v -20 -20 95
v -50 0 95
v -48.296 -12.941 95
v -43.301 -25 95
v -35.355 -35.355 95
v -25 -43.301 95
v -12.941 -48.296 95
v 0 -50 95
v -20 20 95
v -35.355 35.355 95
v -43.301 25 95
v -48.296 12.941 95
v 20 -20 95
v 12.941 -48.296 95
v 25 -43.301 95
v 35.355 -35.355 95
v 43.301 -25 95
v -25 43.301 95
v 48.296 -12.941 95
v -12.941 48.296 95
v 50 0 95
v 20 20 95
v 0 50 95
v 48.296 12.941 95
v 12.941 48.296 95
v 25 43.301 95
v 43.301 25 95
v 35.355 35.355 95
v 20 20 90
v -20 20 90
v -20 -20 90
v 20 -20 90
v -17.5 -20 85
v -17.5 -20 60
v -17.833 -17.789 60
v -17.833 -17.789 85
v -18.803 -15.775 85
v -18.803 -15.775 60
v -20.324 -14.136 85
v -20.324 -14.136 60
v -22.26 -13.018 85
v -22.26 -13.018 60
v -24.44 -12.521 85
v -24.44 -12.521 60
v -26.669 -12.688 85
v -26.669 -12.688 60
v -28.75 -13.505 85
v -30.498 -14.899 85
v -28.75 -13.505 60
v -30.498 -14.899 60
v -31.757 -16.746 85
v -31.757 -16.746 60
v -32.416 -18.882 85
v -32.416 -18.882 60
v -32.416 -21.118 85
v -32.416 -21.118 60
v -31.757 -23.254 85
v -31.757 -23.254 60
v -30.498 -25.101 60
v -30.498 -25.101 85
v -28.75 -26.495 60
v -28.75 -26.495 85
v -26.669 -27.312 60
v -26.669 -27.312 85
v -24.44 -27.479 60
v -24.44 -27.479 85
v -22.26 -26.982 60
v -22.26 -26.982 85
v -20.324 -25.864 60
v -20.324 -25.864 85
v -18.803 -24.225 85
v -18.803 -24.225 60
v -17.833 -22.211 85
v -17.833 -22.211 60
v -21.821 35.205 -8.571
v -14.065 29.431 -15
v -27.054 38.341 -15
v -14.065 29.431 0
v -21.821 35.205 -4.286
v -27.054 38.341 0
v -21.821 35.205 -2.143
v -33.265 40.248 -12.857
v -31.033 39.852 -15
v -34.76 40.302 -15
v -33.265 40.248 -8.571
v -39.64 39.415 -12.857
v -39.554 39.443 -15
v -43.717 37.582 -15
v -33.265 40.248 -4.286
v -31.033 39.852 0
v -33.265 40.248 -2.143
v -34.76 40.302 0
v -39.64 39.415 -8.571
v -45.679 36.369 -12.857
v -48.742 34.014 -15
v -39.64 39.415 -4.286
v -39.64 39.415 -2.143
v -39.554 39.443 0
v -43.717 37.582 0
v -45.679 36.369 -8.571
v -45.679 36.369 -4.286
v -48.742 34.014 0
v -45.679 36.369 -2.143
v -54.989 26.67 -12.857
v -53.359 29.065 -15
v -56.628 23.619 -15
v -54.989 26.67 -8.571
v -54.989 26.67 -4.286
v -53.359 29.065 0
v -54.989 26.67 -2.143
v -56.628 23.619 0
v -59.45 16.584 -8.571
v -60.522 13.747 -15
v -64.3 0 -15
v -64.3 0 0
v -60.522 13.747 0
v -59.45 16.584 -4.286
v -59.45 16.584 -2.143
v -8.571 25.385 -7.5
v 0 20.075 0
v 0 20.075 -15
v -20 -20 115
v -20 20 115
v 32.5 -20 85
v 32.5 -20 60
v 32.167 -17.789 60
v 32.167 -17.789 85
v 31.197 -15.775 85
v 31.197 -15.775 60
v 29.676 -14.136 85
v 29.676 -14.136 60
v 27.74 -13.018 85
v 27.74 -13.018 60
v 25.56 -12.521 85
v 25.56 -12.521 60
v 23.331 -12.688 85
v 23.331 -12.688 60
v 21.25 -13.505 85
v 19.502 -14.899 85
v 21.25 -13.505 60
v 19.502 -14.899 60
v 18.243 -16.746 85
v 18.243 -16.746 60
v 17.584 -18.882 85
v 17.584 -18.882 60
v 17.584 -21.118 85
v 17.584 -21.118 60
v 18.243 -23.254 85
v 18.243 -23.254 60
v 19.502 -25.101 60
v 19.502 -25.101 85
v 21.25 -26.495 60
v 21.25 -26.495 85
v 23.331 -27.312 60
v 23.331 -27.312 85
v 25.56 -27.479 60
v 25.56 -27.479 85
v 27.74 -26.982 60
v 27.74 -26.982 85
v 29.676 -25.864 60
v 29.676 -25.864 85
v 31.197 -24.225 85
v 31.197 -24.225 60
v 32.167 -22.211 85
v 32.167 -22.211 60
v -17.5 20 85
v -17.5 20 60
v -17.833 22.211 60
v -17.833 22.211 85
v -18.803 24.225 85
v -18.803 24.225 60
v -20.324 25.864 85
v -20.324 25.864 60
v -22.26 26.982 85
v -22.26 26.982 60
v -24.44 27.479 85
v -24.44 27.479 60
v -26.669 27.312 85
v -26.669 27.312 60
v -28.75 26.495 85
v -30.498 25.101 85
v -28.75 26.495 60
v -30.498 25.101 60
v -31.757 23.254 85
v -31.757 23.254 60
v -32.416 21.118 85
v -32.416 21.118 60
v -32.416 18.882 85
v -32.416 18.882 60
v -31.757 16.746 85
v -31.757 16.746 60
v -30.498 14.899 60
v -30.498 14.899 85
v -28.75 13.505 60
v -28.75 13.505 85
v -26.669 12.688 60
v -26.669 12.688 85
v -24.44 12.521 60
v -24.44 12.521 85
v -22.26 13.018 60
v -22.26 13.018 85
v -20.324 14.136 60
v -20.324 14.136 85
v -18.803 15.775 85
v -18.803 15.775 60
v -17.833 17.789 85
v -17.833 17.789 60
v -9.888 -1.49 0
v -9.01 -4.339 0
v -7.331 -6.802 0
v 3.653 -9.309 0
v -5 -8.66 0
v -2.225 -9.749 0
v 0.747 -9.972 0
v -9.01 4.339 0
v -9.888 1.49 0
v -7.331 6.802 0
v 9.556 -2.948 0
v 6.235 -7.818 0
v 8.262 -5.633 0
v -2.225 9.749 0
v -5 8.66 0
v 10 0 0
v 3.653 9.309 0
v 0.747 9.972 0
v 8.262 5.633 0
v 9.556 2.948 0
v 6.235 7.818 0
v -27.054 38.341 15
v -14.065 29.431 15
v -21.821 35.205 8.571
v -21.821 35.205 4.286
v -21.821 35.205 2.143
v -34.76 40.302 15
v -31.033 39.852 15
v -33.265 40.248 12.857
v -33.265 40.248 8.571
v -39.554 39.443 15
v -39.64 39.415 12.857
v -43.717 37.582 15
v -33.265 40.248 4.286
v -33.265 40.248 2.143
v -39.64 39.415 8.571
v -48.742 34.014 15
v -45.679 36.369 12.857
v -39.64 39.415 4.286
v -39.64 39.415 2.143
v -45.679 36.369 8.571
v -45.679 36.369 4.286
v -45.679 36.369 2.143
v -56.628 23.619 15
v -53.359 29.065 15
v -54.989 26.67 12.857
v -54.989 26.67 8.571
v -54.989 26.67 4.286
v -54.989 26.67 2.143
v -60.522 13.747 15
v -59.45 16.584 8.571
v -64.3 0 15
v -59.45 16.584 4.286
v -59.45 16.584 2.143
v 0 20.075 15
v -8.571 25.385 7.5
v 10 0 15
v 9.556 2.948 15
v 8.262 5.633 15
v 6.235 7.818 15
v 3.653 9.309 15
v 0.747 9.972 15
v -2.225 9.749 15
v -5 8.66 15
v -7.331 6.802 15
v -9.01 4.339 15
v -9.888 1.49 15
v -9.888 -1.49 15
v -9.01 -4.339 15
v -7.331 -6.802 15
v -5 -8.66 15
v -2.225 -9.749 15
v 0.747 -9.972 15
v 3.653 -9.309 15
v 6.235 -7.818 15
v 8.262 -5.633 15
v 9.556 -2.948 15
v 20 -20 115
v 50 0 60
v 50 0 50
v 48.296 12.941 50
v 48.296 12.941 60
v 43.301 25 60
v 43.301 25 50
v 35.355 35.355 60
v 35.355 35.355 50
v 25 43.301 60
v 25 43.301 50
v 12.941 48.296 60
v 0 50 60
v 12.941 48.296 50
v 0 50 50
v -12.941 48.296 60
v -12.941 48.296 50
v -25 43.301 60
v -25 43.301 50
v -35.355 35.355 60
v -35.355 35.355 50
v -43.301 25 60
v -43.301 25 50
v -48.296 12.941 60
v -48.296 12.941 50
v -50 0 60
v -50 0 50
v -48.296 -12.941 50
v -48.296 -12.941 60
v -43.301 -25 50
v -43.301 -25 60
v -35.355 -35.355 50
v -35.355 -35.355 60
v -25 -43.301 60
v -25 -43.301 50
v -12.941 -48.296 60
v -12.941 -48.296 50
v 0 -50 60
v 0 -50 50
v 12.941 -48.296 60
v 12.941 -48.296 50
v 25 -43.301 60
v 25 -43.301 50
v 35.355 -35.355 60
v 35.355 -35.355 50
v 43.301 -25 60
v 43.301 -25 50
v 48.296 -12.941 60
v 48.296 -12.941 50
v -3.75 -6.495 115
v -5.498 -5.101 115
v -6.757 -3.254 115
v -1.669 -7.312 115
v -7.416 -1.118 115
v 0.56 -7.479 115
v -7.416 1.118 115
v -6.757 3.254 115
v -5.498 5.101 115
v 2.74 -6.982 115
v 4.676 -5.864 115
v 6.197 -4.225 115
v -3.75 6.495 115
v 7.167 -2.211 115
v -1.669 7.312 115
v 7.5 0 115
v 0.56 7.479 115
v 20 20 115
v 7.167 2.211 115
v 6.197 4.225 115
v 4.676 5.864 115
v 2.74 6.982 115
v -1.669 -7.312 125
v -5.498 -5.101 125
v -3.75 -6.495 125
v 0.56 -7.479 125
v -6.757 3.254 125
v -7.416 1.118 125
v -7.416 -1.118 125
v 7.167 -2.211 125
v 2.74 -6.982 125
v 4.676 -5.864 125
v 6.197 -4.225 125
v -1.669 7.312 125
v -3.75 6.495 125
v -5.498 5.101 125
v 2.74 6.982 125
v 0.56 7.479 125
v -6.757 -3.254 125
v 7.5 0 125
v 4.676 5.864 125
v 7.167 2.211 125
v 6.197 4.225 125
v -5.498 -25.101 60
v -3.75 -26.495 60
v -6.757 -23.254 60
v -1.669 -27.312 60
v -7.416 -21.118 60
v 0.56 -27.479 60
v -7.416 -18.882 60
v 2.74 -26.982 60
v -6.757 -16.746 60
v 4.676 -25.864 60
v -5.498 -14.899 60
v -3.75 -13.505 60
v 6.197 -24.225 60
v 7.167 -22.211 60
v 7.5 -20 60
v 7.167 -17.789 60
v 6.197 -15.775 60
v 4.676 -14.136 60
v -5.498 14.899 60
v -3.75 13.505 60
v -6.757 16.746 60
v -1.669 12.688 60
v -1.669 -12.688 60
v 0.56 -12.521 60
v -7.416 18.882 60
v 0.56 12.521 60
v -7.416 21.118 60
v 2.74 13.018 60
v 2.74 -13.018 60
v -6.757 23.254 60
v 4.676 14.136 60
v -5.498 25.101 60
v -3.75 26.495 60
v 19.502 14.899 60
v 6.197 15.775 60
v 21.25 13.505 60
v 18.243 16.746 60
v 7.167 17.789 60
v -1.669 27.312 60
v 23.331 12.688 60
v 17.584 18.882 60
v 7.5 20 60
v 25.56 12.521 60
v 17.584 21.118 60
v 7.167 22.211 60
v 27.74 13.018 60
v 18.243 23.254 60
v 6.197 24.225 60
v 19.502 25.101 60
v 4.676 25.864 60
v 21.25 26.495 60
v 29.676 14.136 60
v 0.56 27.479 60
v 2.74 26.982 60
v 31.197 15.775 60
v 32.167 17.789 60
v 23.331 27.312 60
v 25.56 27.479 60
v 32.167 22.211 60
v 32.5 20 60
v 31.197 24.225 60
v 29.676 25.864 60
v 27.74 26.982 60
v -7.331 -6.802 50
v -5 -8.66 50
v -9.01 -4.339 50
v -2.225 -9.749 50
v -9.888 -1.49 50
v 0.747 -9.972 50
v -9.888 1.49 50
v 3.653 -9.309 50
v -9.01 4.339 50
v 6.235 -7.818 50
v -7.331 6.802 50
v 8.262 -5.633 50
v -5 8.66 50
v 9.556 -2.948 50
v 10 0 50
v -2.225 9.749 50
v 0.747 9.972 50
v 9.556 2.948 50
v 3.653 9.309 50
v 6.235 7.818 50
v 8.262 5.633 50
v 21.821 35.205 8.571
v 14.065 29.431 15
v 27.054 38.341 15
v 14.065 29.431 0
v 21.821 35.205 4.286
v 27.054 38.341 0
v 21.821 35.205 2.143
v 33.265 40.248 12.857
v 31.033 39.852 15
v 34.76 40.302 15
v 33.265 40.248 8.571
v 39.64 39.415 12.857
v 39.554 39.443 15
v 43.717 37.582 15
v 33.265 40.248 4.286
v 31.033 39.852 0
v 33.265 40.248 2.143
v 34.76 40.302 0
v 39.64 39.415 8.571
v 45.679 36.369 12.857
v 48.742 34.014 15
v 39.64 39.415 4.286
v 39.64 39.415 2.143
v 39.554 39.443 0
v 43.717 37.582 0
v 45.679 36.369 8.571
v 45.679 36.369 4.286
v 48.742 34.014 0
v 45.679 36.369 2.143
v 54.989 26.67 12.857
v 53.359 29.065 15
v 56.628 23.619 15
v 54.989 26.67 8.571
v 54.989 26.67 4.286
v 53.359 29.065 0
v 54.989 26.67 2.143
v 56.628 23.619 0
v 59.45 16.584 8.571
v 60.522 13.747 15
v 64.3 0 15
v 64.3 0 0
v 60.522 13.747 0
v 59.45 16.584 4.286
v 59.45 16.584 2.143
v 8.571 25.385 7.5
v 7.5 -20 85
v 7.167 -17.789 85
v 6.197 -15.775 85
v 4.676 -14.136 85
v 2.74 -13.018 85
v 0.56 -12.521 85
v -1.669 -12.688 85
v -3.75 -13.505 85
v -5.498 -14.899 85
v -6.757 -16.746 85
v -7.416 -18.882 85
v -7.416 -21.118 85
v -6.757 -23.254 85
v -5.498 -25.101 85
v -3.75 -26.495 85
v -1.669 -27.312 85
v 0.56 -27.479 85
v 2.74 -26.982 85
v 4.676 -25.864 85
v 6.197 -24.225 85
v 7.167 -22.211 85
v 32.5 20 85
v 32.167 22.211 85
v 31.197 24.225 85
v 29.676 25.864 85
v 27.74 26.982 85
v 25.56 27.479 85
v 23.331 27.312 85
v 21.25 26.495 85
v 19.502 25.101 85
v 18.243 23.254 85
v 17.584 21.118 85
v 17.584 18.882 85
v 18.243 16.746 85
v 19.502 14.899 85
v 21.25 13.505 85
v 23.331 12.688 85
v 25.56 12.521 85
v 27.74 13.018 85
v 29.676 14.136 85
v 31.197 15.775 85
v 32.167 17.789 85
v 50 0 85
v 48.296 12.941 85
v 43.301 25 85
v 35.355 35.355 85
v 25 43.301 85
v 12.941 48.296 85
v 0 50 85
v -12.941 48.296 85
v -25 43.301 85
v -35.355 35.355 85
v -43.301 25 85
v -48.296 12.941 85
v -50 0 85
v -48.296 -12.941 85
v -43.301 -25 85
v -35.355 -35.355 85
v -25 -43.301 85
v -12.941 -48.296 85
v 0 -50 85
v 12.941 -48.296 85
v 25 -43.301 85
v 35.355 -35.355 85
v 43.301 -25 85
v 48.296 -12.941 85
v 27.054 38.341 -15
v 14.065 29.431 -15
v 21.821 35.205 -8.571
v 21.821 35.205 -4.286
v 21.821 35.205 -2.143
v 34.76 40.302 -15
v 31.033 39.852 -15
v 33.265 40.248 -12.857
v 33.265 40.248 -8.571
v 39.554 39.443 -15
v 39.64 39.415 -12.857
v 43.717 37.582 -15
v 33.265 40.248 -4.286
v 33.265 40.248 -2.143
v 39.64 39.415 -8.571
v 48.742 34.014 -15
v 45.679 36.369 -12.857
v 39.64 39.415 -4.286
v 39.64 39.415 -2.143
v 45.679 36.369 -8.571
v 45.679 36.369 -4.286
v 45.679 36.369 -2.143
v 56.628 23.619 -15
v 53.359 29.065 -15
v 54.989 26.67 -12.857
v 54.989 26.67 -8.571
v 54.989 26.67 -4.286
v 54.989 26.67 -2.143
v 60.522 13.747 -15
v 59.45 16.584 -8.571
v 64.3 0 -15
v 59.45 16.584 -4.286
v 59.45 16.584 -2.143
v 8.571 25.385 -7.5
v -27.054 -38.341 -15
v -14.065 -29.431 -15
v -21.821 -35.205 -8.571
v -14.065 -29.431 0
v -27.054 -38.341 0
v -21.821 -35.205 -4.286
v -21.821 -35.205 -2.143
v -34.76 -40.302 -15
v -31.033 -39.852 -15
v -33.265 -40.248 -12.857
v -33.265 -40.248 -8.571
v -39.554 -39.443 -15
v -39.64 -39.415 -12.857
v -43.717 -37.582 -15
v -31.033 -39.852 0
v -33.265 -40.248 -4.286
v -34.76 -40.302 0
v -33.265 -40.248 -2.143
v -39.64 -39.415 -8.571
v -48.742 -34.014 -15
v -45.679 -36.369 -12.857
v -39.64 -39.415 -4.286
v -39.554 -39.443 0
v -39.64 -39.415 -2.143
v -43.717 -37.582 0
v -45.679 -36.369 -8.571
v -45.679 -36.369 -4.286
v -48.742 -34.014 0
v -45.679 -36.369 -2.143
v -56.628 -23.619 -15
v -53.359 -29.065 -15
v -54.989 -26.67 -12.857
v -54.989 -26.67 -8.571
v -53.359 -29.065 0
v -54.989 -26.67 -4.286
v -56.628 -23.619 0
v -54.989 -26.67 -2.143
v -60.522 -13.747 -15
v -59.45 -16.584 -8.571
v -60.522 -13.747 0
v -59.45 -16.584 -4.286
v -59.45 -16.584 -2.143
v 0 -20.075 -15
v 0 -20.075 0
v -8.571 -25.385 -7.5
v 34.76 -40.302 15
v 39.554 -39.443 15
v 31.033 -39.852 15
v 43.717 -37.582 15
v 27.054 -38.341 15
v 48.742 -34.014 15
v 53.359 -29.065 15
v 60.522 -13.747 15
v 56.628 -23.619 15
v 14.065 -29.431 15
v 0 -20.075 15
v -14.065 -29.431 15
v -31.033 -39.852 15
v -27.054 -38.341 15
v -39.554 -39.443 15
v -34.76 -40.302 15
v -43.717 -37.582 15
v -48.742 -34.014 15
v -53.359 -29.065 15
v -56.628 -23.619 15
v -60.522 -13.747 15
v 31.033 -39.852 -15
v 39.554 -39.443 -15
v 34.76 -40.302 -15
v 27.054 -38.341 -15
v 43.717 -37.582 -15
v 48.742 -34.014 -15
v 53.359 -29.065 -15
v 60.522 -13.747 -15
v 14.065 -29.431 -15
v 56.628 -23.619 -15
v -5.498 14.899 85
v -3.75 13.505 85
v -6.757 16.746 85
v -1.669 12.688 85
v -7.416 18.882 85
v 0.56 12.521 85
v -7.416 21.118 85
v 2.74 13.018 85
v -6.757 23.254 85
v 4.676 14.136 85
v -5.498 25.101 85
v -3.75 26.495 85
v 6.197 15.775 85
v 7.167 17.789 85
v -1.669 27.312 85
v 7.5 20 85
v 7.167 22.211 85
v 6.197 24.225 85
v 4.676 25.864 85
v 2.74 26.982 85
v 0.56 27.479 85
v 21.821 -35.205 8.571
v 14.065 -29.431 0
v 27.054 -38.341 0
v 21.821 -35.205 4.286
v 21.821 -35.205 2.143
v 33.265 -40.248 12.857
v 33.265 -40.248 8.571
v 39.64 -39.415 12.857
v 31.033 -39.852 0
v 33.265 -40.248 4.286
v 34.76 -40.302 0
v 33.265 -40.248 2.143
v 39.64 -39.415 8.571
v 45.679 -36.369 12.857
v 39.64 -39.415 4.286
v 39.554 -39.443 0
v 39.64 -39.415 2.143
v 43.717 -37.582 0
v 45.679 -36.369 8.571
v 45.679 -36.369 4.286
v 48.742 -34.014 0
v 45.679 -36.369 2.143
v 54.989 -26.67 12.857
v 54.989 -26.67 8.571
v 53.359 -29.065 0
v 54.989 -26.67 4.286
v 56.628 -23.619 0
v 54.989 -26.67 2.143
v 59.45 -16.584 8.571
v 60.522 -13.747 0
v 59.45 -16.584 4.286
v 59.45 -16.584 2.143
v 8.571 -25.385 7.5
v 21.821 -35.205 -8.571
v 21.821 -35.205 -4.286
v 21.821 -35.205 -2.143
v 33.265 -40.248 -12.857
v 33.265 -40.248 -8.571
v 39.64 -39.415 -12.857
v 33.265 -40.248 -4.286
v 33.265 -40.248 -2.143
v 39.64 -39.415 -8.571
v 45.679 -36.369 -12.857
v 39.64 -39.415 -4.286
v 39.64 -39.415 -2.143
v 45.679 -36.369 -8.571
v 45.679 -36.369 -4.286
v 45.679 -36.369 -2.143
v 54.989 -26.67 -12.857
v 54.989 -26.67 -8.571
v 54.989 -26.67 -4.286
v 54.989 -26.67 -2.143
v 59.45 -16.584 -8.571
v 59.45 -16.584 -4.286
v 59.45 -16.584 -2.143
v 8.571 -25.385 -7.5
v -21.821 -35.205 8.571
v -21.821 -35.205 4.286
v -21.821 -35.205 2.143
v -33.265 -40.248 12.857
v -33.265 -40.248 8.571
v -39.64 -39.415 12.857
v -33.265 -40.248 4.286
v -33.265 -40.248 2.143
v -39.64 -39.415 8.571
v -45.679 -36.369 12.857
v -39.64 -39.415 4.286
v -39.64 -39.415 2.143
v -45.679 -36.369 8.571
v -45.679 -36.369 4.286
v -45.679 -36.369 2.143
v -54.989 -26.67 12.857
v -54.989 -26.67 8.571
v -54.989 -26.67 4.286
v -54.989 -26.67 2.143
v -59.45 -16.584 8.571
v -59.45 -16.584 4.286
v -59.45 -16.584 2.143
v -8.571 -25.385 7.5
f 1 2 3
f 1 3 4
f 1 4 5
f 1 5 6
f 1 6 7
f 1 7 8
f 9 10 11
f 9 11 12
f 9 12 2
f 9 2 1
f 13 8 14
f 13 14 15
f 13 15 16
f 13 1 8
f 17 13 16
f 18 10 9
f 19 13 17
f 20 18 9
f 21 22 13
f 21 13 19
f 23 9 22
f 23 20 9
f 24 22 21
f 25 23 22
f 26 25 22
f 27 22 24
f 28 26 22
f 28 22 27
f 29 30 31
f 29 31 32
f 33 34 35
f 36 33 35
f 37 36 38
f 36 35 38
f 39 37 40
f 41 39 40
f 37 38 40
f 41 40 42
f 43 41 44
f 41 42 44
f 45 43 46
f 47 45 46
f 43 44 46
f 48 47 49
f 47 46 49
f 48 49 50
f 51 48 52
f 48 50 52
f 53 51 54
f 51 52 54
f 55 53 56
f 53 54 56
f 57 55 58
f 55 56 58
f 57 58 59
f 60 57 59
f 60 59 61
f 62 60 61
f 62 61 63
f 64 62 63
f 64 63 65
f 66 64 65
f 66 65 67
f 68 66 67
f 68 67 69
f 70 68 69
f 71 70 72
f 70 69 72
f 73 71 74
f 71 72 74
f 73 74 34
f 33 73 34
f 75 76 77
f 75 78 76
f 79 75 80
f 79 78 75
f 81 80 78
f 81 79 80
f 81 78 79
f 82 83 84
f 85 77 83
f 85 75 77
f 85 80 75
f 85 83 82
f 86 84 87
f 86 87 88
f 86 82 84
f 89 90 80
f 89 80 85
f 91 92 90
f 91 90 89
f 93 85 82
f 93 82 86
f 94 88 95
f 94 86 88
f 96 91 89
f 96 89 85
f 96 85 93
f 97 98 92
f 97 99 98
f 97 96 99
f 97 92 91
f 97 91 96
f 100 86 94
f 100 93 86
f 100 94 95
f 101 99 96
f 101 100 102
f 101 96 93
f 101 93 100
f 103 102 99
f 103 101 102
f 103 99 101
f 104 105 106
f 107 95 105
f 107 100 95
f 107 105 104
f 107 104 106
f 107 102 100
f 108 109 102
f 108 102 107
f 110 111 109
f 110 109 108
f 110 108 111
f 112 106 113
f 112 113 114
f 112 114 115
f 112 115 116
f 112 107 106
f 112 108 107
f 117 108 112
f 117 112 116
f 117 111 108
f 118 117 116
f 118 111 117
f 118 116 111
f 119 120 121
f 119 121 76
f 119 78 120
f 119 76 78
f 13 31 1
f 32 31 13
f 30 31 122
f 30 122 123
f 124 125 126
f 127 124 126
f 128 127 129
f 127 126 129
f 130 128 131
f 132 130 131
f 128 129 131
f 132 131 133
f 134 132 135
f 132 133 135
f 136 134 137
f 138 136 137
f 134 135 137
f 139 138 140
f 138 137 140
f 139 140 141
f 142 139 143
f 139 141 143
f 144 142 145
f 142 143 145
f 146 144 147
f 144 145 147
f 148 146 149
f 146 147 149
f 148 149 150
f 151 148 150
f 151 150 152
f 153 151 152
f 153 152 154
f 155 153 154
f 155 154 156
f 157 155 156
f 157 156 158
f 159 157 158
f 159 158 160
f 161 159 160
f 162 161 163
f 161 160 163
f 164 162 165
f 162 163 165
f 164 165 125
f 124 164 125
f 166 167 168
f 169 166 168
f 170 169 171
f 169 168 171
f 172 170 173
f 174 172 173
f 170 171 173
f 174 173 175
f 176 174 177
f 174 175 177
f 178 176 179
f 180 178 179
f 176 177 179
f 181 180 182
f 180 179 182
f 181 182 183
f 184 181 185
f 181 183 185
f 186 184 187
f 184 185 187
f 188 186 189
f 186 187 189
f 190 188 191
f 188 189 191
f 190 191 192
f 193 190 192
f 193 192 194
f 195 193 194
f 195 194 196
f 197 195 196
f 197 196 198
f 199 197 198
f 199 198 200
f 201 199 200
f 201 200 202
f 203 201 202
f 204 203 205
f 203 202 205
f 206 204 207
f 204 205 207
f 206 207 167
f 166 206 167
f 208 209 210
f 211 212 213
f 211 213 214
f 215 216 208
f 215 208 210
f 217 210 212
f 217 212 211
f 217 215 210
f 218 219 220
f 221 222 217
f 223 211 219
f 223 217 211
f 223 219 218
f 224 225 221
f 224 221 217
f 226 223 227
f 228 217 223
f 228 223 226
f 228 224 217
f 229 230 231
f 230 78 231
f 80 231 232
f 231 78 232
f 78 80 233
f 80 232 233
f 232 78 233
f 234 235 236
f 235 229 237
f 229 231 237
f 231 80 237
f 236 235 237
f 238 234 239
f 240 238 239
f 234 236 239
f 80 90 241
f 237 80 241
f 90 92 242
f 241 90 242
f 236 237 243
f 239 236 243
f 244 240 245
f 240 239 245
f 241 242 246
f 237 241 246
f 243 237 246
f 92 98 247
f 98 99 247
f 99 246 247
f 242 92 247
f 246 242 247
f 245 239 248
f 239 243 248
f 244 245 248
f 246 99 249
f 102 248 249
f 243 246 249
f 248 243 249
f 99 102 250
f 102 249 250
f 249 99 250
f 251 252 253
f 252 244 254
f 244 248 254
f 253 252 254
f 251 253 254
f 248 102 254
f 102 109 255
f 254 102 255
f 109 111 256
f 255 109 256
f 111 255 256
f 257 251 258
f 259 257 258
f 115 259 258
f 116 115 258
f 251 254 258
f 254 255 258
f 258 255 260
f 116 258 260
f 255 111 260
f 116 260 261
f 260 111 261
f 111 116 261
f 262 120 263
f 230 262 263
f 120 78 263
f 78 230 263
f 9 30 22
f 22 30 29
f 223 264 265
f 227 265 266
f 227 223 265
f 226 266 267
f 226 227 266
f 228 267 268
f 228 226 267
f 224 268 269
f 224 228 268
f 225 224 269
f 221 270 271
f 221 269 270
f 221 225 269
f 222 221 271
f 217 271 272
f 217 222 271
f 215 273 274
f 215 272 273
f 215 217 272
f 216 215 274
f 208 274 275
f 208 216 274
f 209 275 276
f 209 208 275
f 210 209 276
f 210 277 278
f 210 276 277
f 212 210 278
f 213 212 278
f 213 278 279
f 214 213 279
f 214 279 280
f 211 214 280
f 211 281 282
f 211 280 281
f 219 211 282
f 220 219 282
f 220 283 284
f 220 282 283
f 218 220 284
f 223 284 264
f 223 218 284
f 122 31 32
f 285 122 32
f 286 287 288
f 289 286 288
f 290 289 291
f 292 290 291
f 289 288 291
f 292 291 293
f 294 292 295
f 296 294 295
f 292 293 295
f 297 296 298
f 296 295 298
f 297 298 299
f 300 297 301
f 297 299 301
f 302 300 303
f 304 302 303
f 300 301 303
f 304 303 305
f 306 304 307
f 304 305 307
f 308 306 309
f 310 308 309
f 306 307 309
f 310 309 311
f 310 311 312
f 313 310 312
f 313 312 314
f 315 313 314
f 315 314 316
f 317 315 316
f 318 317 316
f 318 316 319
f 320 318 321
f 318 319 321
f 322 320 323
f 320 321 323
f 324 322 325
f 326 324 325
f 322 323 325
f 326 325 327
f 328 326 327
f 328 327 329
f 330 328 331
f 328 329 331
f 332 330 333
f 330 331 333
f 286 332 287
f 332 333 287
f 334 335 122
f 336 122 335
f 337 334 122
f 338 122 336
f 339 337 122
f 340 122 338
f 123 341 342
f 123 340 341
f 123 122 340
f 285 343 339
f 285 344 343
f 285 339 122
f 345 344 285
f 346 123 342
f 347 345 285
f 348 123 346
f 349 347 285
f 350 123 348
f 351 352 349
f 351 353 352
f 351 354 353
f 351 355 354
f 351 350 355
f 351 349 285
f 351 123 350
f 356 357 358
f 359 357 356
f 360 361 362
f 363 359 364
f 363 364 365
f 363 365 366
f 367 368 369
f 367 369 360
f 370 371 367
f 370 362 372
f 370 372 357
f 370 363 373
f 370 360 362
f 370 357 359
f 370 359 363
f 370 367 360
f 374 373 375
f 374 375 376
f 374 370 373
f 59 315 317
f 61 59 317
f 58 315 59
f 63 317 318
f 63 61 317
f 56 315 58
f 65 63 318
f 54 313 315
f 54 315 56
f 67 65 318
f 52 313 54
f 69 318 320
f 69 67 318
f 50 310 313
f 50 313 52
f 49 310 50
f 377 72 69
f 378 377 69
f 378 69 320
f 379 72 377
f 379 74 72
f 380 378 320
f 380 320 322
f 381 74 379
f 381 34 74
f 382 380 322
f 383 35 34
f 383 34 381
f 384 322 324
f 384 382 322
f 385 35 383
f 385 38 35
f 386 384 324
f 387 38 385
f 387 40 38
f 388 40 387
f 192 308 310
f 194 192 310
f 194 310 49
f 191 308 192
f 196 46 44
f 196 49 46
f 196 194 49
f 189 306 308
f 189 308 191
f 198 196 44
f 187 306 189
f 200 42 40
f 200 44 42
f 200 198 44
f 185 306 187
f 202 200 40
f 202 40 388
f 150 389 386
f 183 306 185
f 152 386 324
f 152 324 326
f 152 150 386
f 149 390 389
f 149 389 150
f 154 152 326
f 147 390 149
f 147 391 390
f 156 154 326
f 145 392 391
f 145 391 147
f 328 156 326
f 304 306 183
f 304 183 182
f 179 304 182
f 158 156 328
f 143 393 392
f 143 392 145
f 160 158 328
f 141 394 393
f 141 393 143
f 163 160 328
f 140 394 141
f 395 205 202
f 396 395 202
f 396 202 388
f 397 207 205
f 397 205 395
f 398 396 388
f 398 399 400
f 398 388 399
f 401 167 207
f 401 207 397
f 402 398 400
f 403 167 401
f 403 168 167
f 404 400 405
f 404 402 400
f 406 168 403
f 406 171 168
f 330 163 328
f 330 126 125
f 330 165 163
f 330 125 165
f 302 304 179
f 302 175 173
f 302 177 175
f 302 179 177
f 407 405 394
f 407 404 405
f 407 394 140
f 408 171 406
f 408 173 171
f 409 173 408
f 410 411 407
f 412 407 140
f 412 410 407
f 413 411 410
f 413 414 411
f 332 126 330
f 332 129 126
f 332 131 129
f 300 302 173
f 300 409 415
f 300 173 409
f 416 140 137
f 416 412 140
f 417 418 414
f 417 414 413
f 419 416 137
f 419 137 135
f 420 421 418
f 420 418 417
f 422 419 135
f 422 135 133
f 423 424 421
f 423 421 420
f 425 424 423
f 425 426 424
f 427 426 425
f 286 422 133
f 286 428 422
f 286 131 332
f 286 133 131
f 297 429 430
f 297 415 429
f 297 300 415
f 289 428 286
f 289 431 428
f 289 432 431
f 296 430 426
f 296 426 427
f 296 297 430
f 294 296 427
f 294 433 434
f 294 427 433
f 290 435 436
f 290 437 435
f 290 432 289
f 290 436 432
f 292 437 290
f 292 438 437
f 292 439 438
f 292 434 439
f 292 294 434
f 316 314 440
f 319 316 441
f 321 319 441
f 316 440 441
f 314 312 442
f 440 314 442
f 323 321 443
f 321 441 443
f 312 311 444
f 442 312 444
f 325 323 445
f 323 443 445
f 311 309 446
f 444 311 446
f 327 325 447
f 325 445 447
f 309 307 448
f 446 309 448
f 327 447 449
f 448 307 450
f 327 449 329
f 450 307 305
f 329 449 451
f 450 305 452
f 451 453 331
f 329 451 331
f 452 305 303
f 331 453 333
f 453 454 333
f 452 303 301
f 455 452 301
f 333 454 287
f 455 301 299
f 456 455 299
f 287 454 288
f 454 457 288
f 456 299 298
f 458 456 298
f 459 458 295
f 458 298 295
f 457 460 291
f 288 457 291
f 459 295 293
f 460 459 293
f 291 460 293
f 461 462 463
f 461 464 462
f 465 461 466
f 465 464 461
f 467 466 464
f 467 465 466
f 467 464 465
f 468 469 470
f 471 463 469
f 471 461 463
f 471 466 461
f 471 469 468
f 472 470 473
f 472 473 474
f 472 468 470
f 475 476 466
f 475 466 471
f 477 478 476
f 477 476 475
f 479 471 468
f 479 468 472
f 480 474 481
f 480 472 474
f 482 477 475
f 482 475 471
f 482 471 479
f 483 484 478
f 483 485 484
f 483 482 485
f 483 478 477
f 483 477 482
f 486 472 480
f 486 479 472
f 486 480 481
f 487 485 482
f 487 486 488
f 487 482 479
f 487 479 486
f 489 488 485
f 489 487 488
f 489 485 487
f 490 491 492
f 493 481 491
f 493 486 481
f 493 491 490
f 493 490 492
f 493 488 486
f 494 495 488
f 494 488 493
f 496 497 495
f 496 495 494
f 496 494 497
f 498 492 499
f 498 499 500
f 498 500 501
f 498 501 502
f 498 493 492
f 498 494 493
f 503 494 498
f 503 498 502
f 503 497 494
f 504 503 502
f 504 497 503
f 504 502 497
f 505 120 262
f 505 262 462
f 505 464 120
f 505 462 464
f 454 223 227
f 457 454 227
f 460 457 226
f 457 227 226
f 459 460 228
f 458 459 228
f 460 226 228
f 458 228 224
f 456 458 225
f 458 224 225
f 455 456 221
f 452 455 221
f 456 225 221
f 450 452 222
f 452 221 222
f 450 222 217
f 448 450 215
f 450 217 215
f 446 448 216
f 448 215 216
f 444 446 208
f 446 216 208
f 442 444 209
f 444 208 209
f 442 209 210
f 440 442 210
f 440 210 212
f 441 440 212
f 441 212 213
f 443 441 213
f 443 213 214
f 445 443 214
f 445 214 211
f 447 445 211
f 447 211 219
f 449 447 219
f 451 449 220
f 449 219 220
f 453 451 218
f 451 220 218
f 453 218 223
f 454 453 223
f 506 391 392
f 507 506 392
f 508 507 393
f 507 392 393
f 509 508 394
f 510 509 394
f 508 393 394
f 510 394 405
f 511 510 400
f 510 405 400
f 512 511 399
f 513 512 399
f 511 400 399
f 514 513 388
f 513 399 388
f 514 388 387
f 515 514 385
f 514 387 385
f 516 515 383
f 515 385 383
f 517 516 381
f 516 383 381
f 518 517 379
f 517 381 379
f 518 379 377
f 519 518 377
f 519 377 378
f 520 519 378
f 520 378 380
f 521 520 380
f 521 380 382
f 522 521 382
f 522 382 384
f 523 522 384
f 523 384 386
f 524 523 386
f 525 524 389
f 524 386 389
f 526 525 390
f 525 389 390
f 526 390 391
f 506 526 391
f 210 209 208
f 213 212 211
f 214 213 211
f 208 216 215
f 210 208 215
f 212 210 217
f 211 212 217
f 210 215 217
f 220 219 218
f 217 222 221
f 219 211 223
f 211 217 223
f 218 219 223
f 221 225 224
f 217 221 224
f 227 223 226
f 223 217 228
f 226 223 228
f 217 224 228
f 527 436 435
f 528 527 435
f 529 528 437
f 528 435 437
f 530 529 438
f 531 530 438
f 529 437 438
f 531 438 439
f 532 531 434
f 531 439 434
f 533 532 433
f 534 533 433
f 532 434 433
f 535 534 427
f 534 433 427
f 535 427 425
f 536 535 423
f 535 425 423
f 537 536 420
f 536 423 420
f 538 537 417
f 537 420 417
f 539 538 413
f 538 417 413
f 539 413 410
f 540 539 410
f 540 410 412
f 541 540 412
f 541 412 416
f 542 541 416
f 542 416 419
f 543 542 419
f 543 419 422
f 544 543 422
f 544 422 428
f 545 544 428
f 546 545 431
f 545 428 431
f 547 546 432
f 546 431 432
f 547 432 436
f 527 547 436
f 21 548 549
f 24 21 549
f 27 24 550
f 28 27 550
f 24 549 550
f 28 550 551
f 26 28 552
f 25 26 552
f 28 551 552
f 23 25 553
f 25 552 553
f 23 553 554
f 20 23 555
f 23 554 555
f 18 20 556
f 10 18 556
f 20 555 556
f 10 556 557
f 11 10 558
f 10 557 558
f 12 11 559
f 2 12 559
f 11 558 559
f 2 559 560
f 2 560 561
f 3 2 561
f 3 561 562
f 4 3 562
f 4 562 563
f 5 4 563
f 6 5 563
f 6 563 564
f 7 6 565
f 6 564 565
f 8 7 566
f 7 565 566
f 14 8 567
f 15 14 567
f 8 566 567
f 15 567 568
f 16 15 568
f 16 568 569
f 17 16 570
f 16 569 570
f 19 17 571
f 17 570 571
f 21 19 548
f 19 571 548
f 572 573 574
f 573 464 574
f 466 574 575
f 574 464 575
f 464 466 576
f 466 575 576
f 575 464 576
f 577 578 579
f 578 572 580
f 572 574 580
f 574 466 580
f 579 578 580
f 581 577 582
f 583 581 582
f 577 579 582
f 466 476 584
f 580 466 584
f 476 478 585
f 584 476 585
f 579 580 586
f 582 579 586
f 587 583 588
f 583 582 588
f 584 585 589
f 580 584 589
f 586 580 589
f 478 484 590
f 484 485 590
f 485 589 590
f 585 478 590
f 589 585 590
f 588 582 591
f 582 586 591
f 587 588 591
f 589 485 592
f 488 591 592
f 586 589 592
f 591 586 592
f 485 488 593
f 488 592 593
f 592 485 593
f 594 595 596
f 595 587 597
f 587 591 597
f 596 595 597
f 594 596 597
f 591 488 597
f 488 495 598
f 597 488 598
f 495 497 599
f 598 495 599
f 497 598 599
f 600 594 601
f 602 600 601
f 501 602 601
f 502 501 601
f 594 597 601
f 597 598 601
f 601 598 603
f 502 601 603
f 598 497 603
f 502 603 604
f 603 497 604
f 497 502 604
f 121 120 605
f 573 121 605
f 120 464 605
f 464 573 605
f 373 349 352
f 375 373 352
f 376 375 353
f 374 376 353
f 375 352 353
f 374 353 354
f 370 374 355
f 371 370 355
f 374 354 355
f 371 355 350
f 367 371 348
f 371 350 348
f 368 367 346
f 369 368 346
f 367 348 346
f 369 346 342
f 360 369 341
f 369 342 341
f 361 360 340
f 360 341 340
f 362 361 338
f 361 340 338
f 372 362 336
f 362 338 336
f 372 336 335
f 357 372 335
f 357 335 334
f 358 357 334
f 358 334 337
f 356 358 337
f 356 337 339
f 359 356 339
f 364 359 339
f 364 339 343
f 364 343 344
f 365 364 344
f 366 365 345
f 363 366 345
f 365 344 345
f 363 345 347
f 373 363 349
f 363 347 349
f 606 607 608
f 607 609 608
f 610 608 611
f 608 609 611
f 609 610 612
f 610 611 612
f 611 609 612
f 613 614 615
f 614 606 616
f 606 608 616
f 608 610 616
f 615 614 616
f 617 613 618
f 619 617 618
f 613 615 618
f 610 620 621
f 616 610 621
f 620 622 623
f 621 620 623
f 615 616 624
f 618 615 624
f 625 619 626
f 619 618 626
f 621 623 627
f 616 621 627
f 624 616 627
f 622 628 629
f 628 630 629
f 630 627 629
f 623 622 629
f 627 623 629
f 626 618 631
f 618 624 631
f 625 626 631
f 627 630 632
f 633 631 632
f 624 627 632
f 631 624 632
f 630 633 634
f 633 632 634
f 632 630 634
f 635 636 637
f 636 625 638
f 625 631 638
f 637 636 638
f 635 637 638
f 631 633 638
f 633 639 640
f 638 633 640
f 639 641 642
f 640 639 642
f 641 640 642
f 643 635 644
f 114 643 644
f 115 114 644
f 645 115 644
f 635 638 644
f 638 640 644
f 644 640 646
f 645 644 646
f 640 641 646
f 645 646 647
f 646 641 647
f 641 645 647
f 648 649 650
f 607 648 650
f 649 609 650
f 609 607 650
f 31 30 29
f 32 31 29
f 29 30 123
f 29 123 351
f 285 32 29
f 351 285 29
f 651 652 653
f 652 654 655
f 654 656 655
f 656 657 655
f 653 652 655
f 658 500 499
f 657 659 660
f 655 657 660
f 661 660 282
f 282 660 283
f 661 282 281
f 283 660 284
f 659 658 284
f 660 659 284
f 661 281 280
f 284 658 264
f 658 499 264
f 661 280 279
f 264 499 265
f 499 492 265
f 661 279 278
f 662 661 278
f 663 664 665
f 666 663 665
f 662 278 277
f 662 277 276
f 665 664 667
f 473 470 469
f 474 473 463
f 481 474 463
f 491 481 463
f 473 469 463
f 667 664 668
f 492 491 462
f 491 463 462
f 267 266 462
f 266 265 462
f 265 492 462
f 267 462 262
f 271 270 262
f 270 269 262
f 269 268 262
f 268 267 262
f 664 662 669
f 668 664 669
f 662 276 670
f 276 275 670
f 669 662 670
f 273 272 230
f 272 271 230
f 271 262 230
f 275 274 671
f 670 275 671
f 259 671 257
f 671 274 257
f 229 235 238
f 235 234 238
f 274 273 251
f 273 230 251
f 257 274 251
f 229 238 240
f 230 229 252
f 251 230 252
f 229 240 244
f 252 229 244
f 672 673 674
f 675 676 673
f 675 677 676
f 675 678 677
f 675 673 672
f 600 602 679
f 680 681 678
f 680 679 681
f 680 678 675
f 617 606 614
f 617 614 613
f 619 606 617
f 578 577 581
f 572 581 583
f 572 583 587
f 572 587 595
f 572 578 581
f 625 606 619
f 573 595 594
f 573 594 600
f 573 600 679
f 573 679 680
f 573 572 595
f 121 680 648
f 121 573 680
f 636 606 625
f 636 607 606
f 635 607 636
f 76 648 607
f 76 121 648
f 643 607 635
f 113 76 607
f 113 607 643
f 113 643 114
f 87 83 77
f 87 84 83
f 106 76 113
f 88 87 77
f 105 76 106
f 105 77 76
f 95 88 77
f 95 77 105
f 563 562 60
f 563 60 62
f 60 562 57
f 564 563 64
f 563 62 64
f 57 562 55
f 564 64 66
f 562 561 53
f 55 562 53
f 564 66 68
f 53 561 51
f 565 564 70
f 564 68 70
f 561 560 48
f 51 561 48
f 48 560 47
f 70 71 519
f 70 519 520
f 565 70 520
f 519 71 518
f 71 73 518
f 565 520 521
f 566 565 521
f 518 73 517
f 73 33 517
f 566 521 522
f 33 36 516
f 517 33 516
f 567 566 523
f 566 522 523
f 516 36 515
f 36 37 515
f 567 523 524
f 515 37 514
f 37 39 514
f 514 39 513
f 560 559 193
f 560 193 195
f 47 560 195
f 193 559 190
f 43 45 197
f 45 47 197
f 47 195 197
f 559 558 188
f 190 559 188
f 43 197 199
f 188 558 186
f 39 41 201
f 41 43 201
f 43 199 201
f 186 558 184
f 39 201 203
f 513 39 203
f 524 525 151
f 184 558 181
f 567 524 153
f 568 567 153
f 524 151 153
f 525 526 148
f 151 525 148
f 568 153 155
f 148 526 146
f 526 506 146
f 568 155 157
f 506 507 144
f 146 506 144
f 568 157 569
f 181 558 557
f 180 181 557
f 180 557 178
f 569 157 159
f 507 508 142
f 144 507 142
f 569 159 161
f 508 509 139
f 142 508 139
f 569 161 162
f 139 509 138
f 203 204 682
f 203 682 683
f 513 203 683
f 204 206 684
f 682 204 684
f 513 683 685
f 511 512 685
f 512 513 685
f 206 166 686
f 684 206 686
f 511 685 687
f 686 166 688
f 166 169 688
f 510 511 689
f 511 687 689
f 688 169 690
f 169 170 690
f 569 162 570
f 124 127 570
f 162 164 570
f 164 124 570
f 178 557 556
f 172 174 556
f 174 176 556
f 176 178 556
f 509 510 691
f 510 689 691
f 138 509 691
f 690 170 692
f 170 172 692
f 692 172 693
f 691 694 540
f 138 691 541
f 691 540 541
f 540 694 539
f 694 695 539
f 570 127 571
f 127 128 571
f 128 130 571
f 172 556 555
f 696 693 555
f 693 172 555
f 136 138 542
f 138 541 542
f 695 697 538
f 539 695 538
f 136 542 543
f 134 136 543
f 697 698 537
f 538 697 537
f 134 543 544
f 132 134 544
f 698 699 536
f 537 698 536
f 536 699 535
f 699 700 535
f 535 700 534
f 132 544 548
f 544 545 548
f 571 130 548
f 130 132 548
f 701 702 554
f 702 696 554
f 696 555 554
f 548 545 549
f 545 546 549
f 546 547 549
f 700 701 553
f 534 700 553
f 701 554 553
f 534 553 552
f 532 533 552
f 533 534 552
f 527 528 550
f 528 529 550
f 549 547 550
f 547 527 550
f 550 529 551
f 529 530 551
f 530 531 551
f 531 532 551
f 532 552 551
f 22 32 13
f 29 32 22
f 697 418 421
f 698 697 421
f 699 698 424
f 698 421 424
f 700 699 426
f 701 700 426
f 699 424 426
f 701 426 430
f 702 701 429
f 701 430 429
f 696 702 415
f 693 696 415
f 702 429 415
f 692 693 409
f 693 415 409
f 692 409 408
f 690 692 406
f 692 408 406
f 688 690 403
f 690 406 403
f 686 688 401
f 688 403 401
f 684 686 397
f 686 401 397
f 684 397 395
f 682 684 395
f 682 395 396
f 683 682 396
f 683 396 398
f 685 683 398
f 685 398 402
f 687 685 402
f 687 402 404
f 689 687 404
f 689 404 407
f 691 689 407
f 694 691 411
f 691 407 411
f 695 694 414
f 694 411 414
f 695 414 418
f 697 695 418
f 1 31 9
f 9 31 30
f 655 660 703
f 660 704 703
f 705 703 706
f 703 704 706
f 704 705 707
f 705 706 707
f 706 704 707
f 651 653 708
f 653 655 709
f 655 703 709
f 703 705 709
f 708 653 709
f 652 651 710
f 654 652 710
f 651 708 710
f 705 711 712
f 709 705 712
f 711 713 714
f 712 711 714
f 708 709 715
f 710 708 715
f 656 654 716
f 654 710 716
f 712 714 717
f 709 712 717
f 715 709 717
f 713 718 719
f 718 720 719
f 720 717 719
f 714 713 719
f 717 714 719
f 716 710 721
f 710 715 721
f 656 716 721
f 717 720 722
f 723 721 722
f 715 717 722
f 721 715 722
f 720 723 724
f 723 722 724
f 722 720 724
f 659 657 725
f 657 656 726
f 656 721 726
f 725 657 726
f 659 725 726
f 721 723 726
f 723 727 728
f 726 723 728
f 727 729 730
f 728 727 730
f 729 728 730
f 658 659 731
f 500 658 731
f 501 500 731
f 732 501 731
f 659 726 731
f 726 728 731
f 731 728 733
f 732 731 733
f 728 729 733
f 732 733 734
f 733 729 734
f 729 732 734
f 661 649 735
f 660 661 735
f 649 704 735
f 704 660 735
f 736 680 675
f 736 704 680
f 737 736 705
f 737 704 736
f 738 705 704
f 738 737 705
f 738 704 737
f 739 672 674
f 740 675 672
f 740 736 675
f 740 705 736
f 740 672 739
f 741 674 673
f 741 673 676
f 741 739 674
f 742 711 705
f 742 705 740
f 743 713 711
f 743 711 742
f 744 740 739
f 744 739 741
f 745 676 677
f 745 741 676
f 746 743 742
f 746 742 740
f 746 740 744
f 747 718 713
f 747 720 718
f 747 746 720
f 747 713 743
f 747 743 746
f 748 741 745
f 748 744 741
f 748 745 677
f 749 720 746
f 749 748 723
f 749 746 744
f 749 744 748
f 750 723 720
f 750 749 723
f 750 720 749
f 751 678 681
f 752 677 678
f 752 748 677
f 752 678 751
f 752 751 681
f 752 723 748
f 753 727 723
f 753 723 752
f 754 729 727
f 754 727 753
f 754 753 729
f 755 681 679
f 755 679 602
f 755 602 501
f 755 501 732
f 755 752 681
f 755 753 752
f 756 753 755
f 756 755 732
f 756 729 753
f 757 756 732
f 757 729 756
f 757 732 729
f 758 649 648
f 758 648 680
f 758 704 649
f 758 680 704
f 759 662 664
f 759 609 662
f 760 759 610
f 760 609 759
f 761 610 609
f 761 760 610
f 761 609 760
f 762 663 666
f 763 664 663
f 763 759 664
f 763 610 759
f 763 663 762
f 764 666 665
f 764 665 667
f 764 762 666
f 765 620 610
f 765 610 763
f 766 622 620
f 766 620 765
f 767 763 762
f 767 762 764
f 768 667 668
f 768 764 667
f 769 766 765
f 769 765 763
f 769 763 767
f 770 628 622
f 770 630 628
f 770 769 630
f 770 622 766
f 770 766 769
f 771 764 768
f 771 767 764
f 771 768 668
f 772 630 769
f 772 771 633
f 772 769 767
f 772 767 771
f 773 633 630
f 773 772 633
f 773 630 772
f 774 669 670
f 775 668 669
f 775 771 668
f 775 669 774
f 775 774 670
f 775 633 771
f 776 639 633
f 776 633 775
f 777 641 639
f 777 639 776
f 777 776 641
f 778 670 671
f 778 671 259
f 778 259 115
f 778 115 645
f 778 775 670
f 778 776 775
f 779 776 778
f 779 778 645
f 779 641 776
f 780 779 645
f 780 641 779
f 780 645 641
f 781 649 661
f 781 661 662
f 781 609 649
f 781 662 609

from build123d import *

# Parameters (mm, degrees)
F1_DEPTH  = 15
F2_R      = 10
F3_DEPTH  = 50
F5_R      = 50
F6_DEPTH  = 10
F7_R      = 7.5
F8_DEPTH  = 25
F10_R     = 50
F11_DEPTH = 10
F13_W     = 40
F13_H     = 40
F14_DEPTH = 25
F16_R     = 7.5
F17_DEPTH = 10


with BuildPart() as f1:
    # F0 (on Top) → F1 (new body, symmetric)
    with BuildSketch(Plane.XY):
        with BuildLine():
            add(Edge.make_bspline(
                [(0, 20.0754329562), (7.4676722288, 24.3426728994), (13.5930618791, 29.0380885537), (21.6158300602, 35.3377098016), (33.2006076429, 42.3287355464), (46.3499873813, 37.1768668468), (55.6956692254, 27.1688559136), (59.66880705, 15.6441890886), (62.7382826346, 8.2943669482), (64.2995685339, 0)],
                knots=[0, 0, 0, 0, 0.1623483, 0.2827683477, 0.4214675268, 0.5629118195, 0.7067186759, 0.8369694385, 1, 1, 1, 1], degree=3))
            add(Edge.make_bspline(
                [(0, 20.0754329562), (-7.4676722288, 24.3426728994), (-13.5930618791, 29.0380885537), (-21.6158300602, 35.3377098016), (-33.2006076429, 42.3287355464), (-46.3499873813, 37.1768668468), (-55.6956692254, 27.1688559136), (-59.66880705, 15.6441890886), (-62.7382826346, 8.2943669482), (-64.2995685339, 0)],
                knots=[0, 0, 0, 0, 0.1623483, 0.2827683477, 0.4214675268, 0.5629118195, 0.7067186759, 0.8369694385, 1, 1, 1, 1], degree=3))
            add(Edge.make_bspline(
                [(0, -20.0754329562), (-7.4676722288, -24.3426728994), (-13.5930618791, -29.0380885537), (-21.6158300602, -35.3377098016), (-33.2006076429, -42.3287355464), (-46.3499873813, -37.1768668468), (-55.6956692254, -27.1688559136), (-59.66880705, -15.6441890886), (-62.7382826346, -8.2943669482), (-64.2995685339, 0)],
                knots=[0, 0, 0, 0, 0.1623483, 0.2827683477, 0.4214675268, 0.5629118195, 0.7067186759, 0.8369694385, 1, 1, 1, 1], degree=3))
            add(Edge.make_bspline(
                [(0, -20.0754329562), (7.4676722288, -24.3426728994), (13.5930618791, -29.0380885537), (21.6158300602, -35.3377098016), (33.2006076429, -42.3287355464), (46.3499873813, -37.1768668468), (55.6956692254, -27.1688559136), (59.66880705, -15.6441890886), (62.7382826346, -8.2943669482), (64.2995685339, 0)],
                knots=[0, 0, 0, 0, 0.1623483, 0.2827683477, 0.4214675268, 0.5629118195, 0.7067186759, 0.8369694385, 1, 1, 1, 1], degree=3))
        make_face()
    extrude(amount=F1_DEPTH, both=True)


with BuildPart() as f3:
    # F2 (on Top) → F3 (new body)
    with BuildSketch(Plane.XY):
        Circle(F2_R)
    extrude(amount=F3_DEPTH)


with BuildPart() as f1_1:
    add(f1.part)

    # F4: cut F3
    add(f3.part, mode=Mode.SUBTRACT)


with BuildPart() as f3_1:
    add(f3.part)

    # F5 (on face) → F6 (join)
    with BuildSketch(Plane.XY.offset(50)):
        Circle(F5_R)
    extrude(amount=F6_DEPTH)

    # F7 (on face) → F8 (join)
    with BuildSketch(Plane.XY.offset(60)):
        with Locations((-25, 20)):
            Circle(F7_R)
        with Locations((0, 20)):
            Circle(F7_R)
        with Locations((25, 20)):
            Circle(F7_R)
        with Locations((25, -20)):
            Circle(F7_R)
        with Locations((0, -20)):
            Circle(F7_R)
        with Locations((-25, -20)):
            Circle(F7_R)
    extrude(amount=F8_DEPTH)

    # F10 (on offset) → F11 (join)
    with BuildSketch(Plane.XY.offset(85)):
        Circle(F10_R)
    extrude(amount=F11_DEPTH)


with BuildPart() as f14:
    # F13 (on offset) → F14 (new body)
    with BuildSketch(Plane.XY.offset(90)):
        Rectangle(F13_W, F13_H)
    extrude(amount=F14_DEPTH)


with BuildPart() as f3_2:
    add(f3_1.part)

    # F15: cut F14
    add(f14.part, mode=Mode.SUBTRACT)


with BuildPart() as f14_1:
    add(f14.part)

    # F16 (on face) → F17 (join)
    with BuildSketch(Plane.XY.offset(115)):
        Circle(F16_R)
    extrude(amount=F17_DEPTH)


solid = Compound([f1_1.part, f3_2.part, f14_1.part])
